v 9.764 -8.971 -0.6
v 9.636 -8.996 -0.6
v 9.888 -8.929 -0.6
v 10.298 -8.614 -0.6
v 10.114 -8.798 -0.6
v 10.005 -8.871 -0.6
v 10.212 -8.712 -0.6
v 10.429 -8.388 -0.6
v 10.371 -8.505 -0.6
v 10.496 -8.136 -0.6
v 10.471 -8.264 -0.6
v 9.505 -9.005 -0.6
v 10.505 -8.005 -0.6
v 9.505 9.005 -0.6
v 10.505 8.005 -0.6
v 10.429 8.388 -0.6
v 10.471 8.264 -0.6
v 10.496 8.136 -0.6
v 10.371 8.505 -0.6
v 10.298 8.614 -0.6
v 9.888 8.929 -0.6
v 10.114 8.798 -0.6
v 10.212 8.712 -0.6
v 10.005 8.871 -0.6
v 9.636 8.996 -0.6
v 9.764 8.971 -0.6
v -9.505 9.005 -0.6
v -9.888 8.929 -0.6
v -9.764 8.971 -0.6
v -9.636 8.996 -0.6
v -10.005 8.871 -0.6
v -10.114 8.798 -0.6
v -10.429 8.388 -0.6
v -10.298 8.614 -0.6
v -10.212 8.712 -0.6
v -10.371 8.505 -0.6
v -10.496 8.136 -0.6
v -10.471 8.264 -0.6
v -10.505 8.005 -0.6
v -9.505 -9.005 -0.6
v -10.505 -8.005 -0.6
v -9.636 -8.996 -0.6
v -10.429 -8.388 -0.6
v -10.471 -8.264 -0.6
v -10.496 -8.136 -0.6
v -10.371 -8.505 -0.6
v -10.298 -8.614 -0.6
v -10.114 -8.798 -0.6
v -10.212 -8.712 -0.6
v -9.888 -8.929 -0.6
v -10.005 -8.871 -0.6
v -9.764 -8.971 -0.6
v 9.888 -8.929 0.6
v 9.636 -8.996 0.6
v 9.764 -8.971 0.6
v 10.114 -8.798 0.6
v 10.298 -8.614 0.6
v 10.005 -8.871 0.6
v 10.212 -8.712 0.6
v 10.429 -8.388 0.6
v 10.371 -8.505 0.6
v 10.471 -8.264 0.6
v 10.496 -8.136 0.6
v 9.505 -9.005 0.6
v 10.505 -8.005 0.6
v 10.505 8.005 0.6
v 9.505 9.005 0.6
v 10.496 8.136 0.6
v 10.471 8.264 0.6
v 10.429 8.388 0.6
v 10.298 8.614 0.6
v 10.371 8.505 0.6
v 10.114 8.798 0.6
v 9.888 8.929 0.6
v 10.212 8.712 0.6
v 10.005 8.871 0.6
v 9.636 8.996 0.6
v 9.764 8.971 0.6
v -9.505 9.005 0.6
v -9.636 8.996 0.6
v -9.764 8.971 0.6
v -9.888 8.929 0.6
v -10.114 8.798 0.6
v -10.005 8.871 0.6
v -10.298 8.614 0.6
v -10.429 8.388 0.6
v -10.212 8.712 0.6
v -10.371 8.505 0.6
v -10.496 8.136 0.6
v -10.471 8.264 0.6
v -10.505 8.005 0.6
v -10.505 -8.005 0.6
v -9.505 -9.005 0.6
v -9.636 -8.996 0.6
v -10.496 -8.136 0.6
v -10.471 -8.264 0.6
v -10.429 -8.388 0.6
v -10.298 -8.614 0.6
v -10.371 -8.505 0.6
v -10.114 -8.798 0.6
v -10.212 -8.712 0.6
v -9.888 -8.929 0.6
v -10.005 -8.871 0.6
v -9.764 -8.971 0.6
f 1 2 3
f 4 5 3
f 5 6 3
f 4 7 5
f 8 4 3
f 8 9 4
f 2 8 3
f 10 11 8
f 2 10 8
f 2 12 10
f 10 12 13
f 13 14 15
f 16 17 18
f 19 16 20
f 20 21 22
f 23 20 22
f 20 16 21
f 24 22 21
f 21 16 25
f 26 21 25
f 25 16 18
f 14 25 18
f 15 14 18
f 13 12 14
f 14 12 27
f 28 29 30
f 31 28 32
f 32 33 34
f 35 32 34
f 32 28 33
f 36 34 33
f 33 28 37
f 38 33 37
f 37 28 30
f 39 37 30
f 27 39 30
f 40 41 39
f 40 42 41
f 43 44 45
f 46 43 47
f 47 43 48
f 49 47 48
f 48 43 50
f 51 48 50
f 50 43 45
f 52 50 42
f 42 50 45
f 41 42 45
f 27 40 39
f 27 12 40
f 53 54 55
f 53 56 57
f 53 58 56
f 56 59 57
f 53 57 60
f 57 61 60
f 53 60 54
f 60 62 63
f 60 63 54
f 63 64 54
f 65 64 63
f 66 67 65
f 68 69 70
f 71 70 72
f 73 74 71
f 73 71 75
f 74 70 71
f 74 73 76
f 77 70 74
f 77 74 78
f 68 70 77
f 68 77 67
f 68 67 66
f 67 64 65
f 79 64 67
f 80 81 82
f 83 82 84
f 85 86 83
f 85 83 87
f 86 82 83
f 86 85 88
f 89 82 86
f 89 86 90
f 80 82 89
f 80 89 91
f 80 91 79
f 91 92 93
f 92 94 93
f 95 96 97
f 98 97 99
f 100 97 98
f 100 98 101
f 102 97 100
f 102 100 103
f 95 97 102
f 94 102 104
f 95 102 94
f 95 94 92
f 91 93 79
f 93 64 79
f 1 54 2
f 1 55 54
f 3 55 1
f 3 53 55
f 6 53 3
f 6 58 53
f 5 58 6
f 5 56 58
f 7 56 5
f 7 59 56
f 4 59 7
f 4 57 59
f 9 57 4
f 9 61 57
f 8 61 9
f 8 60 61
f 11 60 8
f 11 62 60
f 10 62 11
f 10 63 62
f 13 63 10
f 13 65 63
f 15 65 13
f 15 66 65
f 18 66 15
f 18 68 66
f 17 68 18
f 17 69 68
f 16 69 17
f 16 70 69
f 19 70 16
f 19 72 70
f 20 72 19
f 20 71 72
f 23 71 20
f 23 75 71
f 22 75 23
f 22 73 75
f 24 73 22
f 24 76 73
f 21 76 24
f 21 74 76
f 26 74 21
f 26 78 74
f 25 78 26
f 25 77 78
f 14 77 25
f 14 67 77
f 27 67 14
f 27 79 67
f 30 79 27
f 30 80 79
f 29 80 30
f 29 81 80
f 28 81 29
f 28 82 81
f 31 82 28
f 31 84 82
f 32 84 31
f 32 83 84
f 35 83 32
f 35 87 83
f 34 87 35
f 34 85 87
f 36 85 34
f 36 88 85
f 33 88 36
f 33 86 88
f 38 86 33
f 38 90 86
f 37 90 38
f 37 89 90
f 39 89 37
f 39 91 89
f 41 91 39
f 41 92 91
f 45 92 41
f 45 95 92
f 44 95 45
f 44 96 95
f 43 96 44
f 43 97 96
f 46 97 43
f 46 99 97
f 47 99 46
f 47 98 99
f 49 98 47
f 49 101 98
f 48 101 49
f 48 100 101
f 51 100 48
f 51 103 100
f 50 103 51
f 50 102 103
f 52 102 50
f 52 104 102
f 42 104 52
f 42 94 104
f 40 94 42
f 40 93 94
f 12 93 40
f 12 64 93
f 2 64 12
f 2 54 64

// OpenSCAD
// Printed circuit board: 21.0mm x 18.0mm x 1.2mm (one connected solid)

length_mm = 21.0;
width_mm  = 18.0;
thickness_mm = 1.2;

$fn = 48;

module pcb(len=length_mm, wid=width_mm, th=thickness_mm) {
    // Slightly rounded corners while keeping exact overall dimensions
    corner_r = min(1.0, min(len, wid)/10);
    eps = 0.01;

    color([0.0, 0.4, 0.2])
    linear_extrude(height=th, center=true, convexity=10)
        offset(r=corner_r)
            square([len - 2*corner_r + eps, wid - 2*corner_r + eps], center=true);
}

pcb();
